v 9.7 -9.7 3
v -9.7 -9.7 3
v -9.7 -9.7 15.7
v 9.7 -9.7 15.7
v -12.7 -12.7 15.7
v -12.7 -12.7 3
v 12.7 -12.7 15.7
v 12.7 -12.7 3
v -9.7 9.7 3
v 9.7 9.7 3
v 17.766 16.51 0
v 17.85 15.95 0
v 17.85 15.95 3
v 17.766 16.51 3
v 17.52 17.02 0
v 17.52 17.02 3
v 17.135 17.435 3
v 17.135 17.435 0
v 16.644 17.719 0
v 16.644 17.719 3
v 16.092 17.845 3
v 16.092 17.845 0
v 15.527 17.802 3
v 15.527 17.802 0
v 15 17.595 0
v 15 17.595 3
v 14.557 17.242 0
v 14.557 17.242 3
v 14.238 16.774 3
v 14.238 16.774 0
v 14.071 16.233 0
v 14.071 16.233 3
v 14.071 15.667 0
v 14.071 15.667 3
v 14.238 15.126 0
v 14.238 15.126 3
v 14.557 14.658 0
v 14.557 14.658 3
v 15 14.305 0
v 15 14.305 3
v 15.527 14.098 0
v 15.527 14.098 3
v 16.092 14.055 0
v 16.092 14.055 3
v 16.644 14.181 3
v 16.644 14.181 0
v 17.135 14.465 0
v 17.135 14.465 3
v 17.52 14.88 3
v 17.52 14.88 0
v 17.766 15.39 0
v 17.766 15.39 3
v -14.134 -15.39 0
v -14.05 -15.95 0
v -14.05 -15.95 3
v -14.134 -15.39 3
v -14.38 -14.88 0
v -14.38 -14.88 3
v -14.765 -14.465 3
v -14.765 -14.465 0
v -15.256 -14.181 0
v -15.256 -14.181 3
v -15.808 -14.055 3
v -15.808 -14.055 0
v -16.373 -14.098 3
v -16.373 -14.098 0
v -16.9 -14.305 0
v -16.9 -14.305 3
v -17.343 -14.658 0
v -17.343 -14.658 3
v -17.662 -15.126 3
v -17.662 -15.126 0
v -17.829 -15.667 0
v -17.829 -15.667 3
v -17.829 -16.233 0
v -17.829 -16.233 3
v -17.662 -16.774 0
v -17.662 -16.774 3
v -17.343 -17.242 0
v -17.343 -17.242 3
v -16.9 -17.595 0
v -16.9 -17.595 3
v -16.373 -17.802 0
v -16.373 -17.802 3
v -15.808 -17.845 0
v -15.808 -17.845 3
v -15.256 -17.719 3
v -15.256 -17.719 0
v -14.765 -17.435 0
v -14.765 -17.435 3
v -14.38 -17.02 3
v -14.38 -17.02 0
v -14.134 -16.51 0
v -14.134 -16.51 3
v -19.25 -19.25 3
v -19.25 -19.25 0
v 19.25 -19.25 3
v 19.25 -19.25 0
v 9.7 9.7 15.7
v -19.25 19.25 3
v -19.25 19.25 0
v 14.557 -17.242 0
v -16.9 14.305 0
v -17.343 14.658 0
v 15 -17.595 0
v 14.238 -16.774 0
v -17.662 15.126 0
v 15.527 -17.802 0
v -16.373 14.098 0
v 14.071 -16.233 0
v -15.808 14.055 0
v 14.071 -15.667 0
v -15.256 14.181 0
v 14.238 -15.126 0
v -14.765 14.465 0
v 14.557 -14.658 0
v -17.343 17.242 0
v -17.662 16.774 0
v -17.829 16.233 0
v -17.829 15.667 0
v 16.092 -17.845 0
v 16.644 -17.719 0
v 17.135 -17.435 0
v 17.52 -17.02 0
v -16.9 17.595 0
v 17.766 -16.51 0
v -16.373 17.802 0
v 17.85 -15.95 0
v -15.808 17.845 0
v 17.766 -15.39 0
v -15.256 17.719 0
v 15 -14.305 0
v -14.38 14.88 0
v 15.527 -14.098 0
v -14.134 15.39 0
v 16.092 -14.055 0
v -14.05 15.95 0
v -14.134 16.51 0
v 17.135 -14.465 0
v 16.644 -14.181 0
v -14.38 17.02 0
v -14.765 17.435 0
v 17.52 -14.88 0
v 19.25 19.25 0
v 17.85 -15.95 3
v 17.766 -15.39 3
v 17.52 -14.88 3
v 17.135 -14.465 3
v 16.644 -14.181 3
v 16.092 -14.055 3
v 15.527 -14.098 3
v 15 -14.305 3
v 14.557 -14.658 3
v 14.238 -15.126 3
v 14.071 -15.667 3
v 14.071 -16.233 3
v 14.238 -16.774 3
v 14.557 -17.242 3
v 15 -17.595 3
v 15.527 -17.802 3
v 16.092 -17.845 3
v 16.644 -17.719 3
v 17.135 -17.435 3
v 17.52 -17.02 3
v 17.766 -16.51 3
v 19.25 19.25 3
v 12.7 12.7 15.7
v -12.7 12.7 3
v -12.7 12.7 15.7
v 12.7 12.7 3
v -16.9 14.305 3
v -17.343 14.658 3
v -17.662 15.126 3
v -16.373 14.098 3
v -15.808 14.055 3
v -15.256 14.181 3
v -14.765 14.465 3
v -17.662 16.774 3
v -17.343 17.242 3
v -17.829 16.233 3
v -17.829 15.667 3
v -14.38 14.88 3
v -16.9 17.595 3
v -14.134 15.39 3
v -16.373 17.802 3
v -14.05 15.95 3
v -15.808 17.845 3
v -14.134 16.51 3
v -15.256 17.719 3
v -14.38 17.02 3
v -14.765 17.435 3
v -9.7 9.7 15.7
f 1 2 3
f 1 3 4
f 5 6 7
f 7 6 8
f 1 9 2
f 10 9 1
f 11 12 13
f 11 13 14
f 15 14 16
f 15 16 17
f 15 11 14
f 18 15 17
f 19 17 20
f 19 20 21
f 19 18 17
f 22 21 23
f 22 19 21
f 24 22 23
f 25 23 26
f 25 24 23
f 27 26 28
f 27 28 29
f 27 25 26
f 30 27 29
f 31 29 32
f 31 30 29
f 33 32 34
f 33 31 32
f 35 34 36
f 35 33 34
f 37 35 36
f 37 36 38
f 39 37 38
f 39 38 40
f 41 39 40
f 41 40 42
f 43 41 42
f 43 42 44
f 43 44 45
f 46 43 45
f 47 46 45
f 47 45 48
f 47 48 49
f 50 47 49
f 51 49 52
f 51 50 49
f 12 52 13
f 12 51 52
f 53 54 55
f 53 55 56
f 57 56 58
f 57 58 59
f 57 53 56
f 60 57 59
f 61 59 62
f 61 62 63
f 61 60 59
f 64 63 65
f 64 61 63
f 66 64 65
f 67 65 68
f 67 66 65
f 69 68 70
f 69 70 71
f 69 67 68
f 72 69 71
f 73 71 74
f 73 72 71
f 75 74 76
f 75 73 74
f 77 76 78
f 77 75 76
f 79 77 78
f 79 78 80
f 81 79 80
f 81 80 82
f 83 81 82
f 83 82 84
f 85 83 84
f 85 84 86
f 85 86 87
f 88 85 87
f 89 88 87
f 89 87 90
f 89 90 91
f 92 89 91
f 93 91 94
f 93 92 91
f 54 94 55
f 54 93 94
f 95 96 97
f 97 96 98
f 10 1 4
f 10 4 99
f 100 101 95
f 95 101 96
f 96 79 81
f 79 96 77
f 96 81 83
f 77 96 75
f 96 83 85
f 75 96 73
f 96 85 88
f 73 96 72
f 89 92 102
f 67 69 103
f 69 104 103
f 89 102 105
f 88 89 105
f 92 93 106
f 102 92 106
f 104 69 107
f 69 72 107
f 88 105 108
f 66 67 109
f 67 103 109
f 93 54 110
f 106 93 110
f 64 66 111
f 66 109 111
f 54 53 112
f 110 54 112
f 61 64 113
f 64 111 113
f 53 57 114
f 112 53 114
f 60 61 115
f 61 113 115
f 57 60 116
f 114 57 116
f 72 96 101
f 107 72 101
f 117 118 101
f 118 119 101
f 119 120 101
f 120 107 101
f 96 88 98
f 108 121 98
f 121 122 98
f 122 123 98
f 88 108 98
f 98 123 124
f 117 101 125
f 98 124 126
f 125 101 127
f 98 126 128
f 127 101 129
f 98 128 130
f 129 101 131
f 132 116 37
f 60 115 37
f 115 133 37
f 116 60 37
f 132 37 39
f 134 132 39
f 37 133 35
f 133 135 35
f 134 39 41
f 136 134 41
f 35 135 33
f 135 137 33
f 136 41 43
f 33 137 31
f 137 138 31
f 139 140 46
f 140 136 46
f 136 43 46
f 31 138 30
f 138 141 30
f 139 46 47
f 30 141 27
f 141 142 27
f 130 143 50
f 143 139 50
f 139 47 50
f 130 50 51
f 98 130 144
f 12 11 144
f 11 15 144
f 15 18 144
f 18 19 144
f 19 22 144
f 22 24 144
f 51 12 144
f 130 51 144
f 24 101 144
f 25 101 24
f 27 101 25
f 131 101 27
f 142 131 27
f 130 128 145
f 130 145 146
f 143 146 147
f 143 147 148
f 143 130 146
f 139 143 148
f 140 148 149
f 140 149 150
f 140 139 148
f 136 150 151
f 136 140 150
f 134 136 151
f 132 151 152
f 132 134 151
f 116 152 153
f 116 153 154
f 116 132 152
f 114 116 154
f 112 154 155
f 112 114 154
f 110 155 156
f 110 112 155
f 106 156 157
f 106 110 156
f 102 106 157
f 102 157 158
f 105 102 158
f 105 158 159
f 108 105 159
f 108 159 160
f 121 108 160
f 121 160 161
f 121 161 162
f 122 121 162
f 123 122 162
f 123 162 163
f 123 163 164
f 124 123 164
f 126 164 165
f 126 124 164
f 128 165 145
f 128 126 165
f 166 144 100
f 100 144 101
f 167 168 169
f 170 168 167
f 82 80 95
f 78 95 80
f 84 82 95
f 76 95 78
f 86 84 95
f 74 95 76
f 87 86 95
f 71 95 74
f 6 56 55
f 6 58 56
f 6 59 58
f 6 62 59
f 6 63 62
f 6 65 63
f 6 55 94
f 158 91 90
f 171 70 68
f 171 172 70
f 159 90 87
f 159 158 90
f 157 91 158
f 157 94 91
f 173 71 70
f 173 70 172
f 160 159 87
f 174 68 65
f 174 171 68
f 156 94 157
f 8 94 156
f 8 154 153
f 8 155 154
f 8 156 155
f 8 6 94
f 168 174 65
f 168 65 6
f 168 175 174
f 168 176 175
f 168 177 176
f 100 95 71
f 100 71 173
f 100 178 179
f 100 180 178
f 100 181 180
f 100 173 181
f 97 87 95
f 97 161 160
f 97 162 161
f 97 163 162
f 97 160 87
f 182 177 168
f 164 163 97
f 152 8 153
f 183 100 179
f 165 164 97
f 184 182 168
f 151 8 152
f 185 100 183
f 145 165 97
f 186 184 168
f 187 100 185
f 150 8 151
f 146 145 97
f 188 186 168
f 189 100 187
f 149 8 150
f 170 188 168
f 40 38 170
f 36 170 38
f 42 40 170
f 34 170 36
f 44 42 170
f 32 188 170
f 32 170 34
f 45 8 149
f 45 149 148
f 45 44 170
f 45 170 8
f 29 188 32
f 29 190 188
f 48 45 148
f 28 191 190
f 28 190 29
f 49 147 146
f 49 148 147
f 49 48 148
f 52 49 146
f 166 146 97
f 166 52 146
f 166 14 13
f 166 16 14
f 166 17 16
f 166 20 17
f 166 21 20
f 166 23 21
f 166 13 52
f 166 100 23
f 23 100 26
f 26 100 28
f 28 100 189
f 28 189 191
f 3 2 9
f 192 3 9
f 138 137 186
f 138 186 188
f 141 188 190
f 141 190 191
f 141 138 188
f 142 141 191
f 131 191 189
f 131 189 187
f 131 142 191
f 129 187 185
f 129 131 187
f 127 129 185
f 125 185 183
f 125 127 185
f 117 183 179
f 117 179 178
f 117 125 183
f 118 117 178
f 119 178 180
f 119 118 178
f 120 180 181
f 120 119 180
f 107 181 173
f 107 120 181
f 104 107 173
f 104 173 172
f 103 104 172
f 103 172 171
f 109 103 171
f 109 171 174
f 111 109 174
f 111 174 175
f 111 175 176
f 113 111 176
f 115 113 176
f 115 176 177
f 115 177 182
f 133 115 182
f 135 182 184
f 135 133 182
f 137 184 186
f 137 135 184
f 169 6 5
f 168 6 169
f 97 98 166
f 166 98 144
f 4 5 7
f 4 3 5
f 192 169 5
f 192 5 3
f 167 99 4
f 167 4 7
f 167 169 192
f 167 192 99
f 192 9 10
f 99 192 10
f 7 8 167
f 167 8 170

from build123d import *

# Parameters (mm, degrees)
F0_R     = 1.9
F1_DEPTH = 3
F2_W     = 25.4
F2_H     = 25.4
F2_W_2   = 19.4
F2_H_2   = 19.4
F3_DEPTH = 12.7


with BuildPart() as f1:
    # F0 (on Top) → F1 (new body)
    with BuildSketch(Plane.XY):
        Polygon((-19.25, 19.25), (-19.25, 0), (-19.25, -19.25), (19.25, -19.25), (19.25, 19.25), align=None)
        with Locations((-15.95, -15.95)):
            Circle(F0_R, mode=Mode.SUBTRACT)
        with Locations((15.95, -15.95)):
            Circle(F0_R, mode=Mode.SUBTRACT)
        with Locations((-15.95, 15.95)):
            Circle(F0_R, mode=Mode.SUBTRACT)
        with Locations((15.95, 15.95)):
            Circle(F0_R, mode=Mode.SUBTRACT)
    extrude(amount=F1_DEPTH)

    # F2 (on face) → F3 (join)
    with BuildSketch(Plane.XY.offset(3)):
        Rectangle(F2_W, F2_H)
        Rectangle(F2_W_2, F2_H_2, mode=Mode.SUBTRACT)
    extrude(amount=F3_DEPTH)


solid = f1.part
